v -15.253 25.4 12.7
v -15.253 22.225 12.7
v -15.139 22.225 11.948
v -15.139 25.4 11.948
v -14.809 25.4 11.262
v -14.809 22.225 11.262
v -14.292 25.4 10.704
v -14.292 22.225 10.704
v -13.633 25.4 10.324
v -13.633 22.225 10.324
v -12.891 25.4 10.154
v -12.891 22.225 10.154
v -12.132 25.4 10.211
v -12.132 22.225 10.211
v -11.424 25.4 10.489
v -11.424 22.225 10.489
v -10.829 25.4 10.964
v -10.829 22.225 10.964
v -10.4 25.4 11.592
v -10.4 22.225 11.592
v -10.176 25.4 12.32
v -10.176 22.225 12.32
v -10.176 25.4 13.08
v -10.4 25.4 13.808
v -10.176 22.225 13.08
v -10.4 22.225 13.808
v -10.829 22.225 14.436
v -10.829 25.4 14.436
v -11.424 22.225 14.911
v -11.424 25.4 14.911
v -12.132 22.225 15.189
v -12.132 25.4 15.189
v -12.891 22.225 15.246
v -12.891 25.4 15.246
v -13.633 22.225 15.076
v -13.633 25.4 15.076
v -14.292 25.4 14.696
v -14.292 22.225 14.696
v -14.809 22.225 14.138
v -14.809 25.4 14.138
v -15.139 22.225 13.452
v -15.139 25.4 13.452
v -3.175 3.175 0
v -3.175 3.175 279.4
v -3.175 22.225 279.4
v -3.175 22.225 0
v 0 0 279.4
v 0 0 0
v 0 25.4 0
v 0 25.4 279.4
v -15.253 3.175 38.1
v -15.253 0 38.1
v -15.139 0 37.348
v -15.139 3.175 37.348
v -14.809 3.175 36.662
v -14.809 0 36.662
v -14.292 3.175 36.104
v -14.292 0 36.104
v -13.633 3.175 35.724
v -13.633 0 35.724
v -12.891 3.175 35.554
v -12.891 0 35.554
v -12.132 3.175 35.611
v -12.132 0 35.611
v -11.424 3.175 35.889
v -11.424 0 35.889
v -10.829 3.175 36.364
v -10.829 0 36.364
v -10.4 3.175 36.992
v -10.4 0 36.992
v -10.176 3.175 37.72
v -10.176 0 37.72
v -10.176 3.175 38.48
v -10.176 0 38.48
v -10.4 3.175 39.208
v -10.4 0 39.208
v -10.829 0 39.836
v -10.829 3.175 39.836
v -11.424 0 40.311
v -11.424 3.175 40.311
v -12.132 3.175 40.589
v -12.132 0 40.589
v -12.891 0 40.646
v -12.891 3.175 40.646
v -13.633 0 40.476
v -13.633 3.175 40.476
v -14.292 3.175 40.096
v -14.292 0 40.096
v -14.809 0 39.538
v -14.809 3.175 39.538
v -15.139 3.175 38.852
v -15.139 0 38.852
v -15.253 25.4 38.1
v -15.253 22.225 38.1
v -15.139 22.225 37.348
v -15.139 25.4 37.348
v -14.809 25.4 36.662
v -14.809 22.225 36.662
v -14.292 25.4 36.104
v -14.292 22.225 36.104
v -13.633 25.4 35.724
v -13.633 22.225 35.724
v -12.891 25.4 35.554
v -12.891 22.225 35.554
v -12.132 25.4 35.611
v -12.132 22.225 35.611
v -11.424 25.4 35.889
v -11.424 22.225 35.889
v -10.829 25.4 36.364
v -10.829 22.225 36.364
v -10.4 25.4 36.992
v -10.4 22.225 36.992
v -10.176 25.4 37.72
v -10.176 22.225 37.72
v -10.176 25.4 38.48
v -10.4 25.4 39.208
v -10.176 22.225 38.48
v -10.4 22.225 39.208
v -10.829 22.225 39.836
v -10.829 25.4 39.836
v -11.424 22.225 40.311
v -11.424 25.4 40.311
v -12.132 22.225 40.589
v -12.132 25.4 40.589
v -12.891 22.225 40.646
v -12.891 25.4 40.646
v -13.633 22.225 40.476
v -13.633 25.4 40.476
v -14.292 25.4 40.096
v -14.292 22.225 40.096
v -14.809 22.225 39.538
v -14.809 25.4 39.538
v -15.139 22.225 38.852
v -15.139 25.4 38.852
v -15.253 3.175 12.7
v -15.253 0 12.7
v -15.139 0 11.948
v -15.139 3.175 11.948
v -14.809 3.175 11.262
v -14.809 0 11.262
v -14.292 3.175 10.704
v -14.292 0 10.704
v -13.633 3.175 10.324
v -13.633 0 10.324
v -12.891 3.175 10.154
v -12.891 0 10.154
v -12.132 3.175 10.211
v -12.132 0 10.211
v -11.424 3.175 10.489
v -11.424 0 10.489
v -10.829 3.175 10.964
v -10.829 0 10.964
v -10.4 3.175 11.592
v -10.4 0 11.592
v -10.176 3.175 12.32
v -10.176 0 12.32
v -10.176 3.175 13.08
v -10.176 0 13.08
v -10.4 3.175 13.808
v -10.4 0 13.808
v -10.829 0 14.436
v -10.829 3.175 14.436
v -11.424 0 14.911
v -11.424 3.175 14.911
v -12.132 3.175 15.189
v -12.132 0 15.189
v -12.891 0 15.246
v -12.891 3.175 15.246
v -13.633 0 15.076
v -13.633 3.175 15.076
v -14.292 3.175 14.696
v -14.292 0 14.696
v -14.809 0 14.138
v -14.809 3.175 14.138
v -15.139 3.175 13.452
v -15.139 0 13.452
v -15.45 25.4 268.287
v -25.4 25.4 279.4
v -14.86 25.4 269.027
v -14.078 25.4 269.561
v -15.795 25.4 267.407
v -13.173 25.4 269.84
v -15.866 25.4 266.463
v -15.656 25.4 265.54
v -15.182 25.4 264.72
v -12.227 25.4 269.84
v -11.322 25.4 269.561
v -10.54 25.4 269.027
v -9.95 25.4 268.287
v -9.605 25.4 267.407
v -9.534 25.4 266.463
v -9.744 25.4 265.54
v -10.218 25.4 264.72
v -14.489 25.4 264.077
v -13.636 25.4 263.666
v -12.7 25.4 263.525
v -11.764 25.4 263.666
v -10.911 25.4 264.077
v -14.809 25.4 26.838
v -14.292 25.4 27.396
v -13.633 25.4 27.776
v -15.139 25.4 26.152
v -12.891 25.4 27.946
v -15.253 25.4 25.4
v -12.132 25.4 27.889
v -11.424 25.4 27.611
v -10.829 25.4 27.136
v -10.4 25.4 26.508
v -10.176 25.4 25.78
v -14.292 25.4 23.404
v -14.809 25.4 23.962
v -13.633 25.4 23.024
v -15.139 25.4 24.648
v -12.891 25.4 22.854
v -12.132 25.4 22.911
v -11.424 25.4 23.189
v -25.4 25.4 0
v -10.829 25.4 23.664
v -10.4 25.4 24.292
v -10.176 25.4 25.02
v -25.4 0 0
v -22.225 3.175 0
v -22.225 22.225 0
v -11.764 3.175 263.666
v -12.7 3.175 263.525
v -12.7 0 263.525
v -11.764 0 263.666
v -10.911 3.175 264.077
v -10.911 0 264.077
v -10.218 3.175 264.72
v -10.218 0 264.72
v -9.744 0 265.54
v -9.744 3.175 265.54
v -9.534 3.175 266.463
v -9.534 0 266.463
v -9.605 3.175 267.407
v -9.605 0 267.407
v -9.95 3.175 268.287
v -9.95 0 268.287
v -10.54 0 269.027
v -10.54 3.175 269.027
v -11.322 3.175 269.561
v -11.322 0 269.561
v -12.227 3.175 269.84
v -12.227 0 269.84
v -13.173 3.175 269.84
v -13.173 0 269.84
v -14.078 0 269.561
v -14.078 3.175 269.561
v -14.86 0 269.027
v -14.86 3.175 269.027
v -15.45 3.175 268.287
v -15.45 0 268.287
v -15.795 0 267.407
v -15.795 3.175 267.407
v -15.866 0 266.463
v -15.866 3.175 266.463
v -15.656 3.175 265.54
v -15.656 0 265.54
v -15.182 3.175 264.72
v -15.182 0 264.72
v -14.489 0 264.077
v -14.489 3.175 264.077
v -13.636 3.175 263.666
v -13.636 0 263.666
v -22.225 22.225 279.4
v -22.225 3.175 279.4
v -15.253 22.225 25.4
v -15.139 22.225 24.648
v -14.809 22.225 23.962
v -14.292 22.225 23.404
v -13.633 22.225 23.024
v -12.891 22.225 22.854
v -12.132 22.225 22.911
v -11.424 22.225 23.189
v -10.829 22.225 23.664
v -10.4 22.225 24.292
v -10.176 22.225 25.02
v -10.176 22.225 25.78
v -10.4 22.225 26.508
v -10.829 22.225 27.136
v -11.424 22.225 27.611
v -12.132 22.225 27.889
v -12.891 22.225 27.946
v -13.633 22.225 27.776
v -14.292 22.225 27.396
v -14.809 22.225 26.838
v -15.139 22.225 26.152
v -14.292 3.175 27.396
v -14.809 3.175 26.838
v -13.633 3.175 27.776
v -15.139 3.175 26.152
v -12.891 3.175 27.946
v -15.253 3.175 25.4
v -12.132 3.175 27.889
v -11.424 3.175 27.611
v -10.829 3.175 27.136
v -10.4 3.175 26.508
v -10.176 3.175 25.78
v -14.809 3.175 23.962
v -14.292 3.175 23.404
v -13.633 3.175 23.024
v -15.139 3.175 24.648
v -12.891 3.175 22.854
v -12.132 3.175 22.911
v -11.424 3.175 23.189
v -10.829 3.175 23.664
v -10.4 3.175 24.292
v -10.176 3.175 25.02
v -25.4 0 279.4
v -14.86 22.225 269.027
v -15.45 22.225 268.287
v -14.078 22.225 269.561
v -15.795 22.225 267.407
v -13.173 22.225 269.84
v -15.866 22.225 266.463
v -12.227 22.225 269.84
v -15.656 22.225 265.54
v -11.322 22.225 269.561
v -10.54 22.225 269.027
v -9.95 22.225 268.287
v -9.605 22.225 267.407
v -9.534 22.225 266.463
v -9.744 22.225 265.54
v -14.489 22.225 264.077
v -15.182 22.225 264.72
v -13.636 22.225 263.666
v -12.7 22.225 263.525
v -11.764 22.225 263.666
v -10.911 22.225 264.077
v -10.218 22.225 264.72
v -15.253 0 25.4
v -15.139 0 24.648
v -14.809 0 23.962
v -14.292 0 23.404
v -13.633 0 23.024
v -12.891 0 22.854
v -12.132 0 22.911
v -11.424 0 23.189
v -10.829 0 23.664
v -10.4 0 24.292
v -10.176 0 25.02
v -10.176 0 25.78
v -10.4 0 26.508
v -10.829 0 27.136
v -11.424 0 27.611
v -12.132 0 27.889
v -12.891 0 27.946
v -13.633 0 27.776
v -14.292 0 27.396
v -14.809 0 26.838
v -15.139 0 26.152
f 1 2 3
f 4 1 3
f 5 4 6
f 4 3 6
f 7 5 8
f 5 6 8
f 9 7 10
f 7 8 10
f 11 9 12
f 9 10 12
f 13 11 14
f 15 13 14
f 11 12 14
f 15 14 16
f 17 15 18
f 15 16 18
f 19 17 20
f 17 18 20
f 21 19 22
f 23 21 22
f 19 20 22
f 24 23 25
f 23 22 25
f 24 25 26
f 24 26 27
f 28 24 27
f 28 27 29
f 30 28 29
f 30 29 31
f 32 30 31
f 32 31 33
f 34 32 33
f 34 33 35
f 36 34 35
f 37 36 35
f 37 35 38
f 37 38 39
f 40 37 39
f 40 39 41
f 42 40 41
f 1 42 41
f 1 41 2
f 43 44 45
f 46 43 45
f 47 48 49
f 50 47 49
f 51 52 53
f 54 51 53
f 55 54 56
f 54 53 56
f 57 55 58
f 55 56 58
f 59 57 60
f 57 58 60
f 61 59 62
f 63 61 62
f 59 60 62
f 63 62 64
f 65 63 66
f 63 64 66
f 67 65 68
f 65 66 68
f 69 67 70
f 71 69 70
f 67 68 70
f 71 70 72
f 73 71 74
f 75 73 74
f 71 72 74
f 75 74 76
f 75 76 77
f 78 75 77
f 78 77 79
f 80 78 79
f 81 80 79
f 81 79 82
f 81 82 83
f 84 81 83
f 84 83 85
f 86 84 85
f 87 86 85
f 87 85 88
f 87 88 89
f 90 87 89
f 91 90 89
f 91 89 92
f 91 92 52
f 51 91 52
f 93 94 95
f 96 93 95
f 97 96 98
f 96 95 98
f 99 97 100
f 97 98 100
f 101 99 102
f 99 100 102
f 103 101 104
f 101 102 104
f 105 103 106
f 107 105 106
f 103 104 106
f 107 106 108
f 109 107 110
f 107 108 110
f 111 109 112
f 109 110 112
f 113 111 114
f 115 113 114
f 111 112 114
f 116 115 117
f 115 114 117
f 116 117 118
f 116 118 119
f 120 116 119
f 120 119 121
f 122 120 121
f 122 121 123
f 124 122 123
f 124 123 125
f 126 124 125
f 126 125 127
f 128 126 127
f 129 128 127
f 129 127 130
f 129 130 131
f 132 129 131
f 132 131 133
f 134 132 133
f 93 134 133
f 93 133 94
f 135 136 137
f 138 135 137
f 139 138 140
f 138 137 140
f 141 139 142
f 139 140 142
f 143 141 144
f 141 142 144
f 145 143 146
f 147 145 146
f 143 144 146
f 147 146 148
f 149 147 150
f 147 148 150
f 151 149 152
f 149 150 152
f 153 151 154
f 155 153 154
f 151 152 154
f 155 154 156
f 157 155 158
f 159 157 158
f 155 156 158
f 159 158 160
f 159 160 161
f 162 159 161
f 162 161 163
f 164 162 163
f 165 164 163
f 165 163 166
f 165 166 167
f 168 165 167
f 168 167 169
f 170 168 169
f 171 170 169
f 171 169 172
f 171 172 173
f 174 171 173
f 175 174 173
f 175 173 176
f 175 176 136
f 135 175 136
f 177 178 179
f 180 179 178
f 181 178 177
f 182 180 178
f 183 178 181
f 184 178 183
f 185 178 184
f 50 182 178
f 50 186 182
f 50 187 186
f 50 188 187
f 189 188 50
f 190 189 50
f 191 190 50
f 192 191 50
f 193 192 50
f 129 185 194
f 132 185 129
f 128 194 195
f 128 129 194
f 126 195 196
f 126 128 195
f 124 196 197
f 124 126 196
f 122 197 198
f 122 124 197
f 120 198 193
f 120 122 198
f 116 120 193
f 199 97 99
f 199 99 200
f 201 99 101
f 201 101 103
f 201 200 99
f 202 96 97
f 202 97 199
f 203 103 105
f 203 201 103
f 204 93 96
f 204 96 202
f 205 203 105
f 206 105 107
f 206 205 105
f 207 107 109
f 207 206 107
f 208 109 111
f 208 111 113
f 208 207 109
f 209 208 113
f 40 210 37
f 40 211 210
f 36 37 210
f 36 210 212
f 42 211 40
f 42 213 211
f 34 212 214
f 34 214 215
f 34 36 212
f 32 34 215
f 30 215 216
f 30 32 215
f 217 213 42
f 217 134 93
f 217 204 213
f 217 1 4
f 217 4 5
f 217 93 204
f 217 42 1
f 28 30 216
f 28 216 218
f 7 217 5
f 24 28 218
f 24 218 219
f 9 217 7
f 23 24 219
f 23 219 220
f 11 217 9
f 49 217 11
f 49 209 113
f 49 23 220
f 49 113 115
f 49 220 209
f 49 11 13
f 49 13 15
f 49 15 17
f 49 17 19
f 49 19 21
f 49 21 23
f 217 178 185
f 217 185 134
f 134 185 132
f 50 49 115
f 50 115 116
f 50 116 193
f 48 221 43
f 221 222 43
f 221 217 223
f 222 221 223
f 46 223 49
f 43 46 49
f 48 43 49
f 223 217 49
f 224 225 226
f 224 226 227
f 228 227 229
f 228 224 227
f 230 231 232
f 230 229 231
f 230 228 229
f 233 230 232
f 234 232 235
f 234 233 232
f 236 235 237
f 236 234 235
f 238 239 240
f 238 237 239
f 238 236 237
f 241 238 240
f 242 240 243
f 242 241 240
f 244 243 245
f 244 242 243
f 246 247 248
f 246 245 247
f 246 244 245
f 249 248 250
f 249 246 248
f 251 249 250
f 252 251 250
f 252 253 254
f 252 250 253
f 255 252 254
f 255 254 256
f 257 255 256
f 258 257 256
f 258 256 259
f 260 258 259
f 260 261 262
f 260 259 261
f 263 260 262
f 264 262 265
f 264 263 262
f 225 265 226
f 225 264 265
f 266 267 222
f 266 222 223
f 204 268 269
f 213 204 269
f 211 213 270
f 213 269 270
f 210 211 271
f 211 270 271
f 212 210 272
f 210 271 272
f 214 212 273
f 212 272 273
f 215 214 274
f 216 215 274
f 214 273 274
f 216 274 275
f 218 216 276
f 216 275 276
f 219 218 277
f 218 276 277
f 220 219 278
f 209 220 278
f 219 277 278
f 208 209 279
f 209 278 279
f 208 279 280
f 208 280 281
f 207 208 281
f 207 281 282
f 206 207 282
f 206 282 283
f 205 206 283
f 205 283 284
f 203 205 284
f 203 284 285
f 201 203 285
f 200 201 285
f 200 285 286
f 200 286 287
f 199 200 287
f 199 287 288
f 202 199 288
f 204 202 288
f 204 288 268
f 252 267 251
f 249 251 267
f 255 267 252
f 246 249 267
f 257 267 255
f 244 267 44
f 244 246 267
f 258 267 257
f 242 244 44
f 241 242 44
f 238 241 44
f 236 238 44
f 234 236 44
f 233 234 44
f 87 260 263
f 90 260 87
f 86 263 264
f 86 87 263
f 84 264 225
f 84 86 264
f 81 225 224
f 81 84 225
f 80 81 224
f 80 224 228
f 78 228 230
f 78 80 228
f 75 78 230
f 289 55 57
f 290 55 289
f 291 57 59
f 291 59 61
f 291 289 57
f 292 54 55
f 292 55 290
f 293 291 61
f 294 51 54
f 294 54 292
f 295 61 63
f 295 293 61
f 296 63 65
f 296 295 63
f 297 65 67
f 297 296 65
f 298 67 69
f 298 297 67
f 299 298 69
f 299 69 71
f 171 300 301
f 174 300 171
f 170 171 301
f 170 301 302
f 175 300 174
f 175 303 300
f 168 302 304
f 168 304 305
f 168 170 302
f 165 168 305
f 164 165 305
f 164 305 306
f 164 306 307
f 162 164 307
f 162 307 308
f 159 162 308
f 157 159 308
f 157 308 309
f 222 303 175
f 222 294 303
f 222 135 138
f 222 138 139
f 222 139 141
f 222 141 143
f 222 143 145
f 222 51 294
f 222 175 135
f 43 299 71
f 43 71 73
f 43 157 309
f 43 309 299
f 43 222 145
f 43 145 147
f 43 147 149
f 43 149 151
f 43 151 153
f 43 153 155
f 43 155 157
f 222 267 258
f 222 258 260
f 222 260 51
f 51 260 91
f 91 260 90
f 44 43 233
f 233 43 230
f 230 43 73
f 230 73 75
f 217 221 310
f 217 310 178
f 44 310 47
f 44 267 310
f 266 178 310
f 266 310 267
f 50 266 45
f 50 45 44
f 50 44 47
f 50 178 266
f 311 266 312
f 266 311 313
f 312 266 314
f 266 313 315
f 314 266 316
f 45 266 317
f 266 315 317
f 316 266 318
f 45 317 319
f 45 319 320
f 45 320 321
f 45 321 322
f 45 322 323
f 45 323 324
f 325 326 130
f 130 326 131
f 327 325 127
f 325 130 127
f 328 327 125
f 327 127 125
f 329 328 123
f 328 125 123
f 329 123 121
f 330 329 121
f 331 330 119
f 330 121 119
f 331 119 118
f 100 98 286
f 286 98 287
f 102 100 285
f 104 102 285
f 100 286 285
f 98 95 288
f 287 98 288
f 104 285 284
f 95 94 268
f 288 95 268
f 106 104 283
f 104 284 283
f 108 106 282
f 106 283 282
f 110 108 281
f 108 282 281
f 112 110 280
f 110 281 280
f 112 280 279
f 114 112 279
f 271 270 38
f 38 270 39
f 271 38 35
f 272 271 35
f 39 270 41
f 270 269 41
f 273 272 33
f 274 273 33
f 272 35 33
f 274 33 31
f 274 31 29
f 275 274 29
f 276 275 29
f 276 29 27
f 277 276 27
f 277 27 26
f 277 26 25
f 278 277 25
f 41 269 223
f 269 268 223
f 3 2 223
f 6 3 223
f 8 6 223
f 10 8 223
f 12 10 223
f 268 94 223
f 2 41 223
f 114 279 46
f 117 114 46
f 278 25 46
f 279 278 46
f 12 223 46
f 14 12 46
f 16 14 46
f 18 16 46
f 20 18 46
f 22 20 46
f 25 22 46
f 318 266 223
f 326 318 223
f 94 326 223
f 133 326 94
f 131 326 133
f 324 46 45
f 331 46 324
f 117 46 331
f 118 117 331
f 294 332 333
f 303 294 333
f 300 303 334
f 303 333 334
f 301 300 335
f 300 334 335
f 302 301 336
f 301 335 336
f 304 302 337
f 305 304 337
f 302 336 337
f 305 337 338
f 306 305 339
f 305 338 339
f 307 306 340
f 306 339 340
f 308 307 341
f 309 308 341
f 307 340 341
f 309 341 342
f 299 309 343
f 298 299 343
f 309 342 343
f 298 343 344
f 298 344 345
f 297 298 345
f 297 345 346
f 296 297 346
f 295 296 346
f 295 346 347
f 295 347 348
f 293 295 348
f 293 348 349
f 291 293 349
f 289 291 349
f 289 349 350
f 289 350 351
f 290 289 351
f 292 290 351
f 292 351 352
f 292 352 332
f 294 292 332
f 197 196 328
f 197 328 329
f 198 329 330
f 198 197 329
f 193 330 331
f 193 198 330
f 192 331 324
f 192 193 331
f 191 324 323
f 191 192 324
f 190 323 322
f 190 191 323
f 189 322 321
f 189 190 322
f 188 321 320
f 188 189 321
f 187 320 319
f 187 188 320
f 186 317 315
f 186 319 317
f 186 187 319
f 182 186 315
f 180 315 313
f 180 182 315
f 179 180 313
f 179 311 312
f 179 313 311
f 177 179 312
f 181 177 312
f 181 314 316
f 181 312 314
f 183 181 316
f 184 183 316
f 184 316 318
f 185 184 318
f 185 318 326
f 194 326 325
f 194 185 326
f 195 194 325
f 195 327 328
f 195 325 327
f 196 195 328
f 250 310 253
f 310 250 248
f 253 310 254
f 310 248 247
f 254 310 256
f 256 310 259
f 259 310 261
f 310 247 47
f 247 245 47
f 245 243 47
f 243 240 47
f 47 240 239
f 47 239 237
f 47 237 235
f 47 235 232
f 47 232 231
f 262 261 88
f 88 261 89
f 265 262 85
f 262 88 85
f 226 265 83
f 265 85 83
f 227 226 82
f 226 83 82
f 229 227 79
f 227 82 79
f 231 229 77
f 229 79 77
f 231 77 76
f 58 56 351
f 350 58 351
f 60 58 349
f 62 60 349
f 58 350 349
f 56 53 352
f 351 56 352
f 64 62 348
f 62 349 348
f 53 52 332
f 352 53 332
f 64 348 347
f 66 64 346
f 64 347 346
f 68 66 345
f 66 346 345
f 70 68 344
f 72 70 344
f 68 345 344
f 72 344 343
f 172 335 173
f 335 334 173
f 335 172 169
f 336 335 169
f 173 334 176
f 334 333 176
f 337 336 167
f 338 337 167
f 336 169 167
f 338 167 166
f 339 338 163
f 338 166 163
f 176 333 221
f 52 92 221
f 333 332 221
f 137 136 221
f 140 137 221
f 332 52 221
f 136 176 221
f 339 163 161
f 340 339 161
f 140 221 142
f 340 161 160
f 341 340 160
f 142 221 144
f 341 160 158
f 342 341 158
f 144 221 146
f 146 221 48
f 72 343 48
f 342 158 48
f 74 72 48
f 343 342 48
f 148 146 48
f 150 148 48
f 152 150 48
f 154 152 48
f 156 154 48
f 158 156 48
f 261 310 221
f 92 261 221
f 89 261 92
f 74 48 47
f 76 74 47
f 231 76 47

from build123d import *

# Parameters (mm, degrees)
SKETCH1_W               = 25.4
SKETCH1_H               = 25.4
SKETCH1_W_2             = 19.05
SKETCH1_H_2             = 19.05
BOSS_EXTRUDE1_DEPTH     = 279.4
CUT_EXTRUDE1_DEPTH      = 282.699627263
CUT_EXTRUDE1_DEPTH_BACK = 282.699627263
SKETCH2_R               = 3.175
F_10_CLEARANCE_HOLE1_D  = 5.1054


with BuildPart() as part:
    # Sketch1 → Boss-Extrude1 (new body)
    with BuildSketch(Plane.XY):
        with Locations((-12.7, 12.7)):
            Rectangle(SKETCH1_W, SKETCH1_H)
        with Locations((-12.7, 12.7)):
            Rectangle(SKETCH1_W_2, SKETCH1_H_2, mode=Mode.SUBTRACT)
    extrude(amount=BOSS_EXTRUDE1_DEPTH)

    # Sketch2 → Cut-Extrude1 (cut, two sides: drawn at the far end of the back side and taken through both)
    with BuildSketch(Plane(origin=(0, 0, 0), x_dir=(-1, 0, 0), z_dir=(0, -1, 0)).offset(-CUT_EXTRUDE1_DEPTH_BACK)):
        with Locations(Location((12.7, -266.7, 0), (0, 0, 90))):
            Circle(SKETCH2_R)
    extrude(amount=CUT_EXTRUDE1_DEPTH + CUT_EXTRUDE1_DEPTH_BACK, mode=Mode.SUBTRACT)

    # #10 Clearance Hole1 (through all)
    with Locations(Plane(origin=(0, 25.4, 0), x_dir=(1, 0, 0), z_dir=(0, 1, 0))):
        with Locations((-12.7, -38.1), (-12.7, -25.4), (-12.7, -12.7)):
            Hole(F_10_CLEARANCE_HOLE1_D / 2)


solid = part.part
